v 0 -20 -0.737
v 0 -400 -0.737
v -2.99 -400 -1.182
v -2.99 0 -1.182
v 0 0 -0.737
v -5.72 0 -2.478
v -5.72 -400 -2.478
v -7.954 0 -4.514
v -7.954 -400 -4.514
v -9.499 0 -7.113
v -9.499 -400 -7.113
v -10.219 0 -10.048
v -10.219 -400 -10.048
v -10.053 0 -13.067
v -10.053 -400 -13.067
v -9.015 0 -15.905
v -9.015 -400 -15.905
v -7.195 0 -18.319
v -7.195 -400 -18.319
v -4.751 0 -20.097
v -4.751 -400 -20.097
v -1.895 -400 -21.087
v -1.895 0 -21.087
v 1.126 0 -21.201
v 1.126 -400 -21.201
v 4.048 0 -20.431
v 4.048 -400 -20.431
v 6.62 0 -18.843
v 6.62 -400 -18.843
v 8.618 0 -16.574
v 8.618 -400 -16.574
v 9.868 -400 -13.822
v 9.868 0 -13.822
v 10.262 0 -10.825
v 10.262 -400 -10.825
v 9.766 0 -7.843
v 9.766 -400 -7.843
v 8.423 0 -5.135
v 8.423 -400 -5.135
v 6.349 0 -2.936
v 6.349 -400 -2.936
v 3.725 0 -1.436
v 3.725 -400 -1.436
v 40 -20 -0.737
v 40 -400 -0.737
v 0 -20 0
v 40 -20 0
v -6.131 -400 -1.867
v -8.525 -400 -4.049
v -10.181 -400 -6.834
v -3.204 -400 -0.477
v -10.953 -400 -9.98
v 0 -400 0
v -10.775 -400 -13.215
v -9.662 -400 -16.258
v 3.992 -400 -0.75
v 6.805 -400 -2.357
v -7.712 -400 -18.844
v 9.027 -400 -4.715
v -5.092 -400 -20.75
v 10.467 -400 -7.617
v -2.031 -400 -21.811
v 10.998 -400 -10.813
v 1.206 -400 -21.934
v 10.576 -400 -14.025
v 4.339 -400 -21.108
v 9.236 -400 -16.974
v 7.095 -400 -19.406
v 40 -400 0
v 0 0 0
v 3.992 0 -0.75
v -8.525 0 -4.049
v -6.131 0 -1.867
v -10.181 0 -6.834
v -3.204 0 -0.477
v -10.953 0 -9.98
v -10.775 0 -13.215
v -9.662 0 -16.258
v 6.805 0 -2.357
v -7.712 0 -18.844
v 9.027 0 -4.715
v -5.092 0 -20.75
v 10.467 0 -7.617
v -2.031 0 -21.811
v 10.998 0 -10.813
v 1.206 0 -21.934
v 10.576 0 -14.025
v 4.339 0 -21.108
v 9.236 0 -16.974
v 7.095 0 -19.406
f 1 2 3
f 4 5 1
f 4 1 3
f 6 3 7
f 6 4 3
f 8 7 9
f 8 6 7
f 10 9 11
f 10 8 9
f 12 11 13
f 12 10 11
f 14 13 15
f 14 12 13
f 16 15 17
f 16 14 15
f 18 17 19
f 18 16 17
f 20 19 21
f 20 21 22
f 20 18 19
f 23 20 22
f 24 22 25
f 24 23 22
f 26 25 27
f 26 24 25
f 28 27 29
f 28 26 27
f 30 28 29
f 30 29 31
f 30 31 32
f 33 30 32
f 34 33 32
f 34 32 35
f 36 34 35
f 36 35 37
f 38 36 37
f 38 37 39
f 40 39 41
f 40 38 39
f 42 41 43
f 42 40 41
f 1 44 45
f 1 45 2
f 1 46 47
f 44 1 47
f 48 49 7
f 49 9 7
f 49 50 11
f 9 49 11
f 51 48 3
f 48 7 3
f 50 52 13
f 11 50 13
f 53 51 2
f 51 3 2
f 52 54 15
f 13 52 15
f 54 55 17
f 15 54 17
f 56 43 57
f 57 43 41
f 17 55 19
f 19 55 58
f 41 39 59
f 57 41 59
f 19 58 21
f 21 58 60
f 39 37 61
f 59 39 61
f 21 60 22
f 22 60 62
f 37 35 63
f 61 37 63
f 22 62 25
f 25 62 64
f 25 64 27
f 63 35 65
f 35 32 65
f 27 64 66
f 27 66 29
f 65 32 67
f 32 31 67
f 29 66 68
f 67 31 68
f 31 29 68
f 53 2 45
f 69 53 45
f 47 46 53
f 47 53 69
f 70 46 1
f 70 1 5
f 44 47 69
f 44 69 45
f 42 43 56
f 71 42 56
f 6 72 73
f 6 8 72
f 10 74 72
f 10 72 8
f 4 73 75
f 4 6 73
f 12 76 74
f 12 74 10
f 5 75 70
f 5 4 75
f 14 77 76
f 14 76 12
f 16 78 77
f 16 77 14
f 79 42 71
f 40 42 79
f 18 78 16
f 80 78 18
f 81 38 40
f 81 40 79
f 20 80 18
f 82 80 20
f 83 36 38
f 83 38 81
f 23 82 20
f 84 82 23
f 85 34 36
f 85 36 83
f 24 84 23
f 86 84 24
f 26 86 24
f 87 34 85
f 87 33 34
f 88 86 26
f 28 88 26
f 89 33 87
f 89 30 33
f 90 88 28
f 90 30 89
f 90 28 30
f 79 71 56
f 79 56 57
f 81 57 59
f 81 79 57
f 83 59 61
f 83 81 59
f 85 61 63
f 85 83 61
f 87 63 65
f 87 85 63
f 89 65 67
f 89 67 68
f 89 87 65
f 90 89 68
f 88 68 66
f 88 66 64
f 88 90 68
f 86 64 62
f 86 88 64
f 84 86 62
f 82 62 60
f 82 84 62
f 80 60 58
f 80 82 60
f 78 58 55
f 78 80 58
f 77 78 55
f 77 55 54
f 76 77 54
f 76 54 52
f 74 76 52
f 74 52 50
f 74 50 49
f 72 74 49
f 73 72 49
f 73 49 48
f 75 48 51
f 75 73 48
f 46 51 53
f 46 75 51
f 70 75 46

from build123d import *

# Parameters (mm, degrees)
ODGI_CIE_BAZOWE1_DEPTH     = 400
WYTNIJ_WYCI_GNI_CIE1_REACH = 404.597
SZKIC6_W                   = 40
SZKIC6_H                   = 20


# Sheet-metal steps are written as plain solids
with BuildPart() as part:
    # Szkic1 → Odgięcie bazowe1 (new body)
    with BuildSketch(Plane(origin=(0, 0, 0), x_dir=(1, 0, 0), z_dir=(0, 1, 0))):
        with BuildLine():
            ThreePointArc((3.992179856, 0.75), (-2.031009601, 21.810874155), (0, 0))
            Line((0, 0), (40, 0))
            Line((40, 0), (40, 0.7366))
            Line((40, 0.7366), (0, 0.7366))
            ThreePointArc((0, 0.7366), (-1.895005813, 21.08693871), (3.724848976, 1.436377273))
            Line((3.724848976, 1.436377273), (3.992179856, 0.75))
        make_face()
    extrude(amount=-ODGI_CIE_BAZOWE1_DEPTH)

    # Szkic6 → Wytnij-wyciągnięcie1 (cut, up to next)
    with BuildSketch(Plane.XY, mode=Mode.PRIVATE) as wytnij_wyci_gni_cie1_sk1:
        with Locations((20, -10)):
            Rectangle(SZKIC6_W, SZKIC6_H)
    wytnij_wyci_gni_cie1_tool1 = extrude(wytnij_wyci_gni_cie1_sk1.sketch, amount=-WYTNIJ_WYCI_GNI_CIE1_REACH, mode=Mode.PRIVATE) & part.part
    add(wytnij_wyci_gni_cie1_tool1.solids().sort_by_distance((20, -10, 0))[0], mode=Mode.SUBTRACT)


solid = part.part
